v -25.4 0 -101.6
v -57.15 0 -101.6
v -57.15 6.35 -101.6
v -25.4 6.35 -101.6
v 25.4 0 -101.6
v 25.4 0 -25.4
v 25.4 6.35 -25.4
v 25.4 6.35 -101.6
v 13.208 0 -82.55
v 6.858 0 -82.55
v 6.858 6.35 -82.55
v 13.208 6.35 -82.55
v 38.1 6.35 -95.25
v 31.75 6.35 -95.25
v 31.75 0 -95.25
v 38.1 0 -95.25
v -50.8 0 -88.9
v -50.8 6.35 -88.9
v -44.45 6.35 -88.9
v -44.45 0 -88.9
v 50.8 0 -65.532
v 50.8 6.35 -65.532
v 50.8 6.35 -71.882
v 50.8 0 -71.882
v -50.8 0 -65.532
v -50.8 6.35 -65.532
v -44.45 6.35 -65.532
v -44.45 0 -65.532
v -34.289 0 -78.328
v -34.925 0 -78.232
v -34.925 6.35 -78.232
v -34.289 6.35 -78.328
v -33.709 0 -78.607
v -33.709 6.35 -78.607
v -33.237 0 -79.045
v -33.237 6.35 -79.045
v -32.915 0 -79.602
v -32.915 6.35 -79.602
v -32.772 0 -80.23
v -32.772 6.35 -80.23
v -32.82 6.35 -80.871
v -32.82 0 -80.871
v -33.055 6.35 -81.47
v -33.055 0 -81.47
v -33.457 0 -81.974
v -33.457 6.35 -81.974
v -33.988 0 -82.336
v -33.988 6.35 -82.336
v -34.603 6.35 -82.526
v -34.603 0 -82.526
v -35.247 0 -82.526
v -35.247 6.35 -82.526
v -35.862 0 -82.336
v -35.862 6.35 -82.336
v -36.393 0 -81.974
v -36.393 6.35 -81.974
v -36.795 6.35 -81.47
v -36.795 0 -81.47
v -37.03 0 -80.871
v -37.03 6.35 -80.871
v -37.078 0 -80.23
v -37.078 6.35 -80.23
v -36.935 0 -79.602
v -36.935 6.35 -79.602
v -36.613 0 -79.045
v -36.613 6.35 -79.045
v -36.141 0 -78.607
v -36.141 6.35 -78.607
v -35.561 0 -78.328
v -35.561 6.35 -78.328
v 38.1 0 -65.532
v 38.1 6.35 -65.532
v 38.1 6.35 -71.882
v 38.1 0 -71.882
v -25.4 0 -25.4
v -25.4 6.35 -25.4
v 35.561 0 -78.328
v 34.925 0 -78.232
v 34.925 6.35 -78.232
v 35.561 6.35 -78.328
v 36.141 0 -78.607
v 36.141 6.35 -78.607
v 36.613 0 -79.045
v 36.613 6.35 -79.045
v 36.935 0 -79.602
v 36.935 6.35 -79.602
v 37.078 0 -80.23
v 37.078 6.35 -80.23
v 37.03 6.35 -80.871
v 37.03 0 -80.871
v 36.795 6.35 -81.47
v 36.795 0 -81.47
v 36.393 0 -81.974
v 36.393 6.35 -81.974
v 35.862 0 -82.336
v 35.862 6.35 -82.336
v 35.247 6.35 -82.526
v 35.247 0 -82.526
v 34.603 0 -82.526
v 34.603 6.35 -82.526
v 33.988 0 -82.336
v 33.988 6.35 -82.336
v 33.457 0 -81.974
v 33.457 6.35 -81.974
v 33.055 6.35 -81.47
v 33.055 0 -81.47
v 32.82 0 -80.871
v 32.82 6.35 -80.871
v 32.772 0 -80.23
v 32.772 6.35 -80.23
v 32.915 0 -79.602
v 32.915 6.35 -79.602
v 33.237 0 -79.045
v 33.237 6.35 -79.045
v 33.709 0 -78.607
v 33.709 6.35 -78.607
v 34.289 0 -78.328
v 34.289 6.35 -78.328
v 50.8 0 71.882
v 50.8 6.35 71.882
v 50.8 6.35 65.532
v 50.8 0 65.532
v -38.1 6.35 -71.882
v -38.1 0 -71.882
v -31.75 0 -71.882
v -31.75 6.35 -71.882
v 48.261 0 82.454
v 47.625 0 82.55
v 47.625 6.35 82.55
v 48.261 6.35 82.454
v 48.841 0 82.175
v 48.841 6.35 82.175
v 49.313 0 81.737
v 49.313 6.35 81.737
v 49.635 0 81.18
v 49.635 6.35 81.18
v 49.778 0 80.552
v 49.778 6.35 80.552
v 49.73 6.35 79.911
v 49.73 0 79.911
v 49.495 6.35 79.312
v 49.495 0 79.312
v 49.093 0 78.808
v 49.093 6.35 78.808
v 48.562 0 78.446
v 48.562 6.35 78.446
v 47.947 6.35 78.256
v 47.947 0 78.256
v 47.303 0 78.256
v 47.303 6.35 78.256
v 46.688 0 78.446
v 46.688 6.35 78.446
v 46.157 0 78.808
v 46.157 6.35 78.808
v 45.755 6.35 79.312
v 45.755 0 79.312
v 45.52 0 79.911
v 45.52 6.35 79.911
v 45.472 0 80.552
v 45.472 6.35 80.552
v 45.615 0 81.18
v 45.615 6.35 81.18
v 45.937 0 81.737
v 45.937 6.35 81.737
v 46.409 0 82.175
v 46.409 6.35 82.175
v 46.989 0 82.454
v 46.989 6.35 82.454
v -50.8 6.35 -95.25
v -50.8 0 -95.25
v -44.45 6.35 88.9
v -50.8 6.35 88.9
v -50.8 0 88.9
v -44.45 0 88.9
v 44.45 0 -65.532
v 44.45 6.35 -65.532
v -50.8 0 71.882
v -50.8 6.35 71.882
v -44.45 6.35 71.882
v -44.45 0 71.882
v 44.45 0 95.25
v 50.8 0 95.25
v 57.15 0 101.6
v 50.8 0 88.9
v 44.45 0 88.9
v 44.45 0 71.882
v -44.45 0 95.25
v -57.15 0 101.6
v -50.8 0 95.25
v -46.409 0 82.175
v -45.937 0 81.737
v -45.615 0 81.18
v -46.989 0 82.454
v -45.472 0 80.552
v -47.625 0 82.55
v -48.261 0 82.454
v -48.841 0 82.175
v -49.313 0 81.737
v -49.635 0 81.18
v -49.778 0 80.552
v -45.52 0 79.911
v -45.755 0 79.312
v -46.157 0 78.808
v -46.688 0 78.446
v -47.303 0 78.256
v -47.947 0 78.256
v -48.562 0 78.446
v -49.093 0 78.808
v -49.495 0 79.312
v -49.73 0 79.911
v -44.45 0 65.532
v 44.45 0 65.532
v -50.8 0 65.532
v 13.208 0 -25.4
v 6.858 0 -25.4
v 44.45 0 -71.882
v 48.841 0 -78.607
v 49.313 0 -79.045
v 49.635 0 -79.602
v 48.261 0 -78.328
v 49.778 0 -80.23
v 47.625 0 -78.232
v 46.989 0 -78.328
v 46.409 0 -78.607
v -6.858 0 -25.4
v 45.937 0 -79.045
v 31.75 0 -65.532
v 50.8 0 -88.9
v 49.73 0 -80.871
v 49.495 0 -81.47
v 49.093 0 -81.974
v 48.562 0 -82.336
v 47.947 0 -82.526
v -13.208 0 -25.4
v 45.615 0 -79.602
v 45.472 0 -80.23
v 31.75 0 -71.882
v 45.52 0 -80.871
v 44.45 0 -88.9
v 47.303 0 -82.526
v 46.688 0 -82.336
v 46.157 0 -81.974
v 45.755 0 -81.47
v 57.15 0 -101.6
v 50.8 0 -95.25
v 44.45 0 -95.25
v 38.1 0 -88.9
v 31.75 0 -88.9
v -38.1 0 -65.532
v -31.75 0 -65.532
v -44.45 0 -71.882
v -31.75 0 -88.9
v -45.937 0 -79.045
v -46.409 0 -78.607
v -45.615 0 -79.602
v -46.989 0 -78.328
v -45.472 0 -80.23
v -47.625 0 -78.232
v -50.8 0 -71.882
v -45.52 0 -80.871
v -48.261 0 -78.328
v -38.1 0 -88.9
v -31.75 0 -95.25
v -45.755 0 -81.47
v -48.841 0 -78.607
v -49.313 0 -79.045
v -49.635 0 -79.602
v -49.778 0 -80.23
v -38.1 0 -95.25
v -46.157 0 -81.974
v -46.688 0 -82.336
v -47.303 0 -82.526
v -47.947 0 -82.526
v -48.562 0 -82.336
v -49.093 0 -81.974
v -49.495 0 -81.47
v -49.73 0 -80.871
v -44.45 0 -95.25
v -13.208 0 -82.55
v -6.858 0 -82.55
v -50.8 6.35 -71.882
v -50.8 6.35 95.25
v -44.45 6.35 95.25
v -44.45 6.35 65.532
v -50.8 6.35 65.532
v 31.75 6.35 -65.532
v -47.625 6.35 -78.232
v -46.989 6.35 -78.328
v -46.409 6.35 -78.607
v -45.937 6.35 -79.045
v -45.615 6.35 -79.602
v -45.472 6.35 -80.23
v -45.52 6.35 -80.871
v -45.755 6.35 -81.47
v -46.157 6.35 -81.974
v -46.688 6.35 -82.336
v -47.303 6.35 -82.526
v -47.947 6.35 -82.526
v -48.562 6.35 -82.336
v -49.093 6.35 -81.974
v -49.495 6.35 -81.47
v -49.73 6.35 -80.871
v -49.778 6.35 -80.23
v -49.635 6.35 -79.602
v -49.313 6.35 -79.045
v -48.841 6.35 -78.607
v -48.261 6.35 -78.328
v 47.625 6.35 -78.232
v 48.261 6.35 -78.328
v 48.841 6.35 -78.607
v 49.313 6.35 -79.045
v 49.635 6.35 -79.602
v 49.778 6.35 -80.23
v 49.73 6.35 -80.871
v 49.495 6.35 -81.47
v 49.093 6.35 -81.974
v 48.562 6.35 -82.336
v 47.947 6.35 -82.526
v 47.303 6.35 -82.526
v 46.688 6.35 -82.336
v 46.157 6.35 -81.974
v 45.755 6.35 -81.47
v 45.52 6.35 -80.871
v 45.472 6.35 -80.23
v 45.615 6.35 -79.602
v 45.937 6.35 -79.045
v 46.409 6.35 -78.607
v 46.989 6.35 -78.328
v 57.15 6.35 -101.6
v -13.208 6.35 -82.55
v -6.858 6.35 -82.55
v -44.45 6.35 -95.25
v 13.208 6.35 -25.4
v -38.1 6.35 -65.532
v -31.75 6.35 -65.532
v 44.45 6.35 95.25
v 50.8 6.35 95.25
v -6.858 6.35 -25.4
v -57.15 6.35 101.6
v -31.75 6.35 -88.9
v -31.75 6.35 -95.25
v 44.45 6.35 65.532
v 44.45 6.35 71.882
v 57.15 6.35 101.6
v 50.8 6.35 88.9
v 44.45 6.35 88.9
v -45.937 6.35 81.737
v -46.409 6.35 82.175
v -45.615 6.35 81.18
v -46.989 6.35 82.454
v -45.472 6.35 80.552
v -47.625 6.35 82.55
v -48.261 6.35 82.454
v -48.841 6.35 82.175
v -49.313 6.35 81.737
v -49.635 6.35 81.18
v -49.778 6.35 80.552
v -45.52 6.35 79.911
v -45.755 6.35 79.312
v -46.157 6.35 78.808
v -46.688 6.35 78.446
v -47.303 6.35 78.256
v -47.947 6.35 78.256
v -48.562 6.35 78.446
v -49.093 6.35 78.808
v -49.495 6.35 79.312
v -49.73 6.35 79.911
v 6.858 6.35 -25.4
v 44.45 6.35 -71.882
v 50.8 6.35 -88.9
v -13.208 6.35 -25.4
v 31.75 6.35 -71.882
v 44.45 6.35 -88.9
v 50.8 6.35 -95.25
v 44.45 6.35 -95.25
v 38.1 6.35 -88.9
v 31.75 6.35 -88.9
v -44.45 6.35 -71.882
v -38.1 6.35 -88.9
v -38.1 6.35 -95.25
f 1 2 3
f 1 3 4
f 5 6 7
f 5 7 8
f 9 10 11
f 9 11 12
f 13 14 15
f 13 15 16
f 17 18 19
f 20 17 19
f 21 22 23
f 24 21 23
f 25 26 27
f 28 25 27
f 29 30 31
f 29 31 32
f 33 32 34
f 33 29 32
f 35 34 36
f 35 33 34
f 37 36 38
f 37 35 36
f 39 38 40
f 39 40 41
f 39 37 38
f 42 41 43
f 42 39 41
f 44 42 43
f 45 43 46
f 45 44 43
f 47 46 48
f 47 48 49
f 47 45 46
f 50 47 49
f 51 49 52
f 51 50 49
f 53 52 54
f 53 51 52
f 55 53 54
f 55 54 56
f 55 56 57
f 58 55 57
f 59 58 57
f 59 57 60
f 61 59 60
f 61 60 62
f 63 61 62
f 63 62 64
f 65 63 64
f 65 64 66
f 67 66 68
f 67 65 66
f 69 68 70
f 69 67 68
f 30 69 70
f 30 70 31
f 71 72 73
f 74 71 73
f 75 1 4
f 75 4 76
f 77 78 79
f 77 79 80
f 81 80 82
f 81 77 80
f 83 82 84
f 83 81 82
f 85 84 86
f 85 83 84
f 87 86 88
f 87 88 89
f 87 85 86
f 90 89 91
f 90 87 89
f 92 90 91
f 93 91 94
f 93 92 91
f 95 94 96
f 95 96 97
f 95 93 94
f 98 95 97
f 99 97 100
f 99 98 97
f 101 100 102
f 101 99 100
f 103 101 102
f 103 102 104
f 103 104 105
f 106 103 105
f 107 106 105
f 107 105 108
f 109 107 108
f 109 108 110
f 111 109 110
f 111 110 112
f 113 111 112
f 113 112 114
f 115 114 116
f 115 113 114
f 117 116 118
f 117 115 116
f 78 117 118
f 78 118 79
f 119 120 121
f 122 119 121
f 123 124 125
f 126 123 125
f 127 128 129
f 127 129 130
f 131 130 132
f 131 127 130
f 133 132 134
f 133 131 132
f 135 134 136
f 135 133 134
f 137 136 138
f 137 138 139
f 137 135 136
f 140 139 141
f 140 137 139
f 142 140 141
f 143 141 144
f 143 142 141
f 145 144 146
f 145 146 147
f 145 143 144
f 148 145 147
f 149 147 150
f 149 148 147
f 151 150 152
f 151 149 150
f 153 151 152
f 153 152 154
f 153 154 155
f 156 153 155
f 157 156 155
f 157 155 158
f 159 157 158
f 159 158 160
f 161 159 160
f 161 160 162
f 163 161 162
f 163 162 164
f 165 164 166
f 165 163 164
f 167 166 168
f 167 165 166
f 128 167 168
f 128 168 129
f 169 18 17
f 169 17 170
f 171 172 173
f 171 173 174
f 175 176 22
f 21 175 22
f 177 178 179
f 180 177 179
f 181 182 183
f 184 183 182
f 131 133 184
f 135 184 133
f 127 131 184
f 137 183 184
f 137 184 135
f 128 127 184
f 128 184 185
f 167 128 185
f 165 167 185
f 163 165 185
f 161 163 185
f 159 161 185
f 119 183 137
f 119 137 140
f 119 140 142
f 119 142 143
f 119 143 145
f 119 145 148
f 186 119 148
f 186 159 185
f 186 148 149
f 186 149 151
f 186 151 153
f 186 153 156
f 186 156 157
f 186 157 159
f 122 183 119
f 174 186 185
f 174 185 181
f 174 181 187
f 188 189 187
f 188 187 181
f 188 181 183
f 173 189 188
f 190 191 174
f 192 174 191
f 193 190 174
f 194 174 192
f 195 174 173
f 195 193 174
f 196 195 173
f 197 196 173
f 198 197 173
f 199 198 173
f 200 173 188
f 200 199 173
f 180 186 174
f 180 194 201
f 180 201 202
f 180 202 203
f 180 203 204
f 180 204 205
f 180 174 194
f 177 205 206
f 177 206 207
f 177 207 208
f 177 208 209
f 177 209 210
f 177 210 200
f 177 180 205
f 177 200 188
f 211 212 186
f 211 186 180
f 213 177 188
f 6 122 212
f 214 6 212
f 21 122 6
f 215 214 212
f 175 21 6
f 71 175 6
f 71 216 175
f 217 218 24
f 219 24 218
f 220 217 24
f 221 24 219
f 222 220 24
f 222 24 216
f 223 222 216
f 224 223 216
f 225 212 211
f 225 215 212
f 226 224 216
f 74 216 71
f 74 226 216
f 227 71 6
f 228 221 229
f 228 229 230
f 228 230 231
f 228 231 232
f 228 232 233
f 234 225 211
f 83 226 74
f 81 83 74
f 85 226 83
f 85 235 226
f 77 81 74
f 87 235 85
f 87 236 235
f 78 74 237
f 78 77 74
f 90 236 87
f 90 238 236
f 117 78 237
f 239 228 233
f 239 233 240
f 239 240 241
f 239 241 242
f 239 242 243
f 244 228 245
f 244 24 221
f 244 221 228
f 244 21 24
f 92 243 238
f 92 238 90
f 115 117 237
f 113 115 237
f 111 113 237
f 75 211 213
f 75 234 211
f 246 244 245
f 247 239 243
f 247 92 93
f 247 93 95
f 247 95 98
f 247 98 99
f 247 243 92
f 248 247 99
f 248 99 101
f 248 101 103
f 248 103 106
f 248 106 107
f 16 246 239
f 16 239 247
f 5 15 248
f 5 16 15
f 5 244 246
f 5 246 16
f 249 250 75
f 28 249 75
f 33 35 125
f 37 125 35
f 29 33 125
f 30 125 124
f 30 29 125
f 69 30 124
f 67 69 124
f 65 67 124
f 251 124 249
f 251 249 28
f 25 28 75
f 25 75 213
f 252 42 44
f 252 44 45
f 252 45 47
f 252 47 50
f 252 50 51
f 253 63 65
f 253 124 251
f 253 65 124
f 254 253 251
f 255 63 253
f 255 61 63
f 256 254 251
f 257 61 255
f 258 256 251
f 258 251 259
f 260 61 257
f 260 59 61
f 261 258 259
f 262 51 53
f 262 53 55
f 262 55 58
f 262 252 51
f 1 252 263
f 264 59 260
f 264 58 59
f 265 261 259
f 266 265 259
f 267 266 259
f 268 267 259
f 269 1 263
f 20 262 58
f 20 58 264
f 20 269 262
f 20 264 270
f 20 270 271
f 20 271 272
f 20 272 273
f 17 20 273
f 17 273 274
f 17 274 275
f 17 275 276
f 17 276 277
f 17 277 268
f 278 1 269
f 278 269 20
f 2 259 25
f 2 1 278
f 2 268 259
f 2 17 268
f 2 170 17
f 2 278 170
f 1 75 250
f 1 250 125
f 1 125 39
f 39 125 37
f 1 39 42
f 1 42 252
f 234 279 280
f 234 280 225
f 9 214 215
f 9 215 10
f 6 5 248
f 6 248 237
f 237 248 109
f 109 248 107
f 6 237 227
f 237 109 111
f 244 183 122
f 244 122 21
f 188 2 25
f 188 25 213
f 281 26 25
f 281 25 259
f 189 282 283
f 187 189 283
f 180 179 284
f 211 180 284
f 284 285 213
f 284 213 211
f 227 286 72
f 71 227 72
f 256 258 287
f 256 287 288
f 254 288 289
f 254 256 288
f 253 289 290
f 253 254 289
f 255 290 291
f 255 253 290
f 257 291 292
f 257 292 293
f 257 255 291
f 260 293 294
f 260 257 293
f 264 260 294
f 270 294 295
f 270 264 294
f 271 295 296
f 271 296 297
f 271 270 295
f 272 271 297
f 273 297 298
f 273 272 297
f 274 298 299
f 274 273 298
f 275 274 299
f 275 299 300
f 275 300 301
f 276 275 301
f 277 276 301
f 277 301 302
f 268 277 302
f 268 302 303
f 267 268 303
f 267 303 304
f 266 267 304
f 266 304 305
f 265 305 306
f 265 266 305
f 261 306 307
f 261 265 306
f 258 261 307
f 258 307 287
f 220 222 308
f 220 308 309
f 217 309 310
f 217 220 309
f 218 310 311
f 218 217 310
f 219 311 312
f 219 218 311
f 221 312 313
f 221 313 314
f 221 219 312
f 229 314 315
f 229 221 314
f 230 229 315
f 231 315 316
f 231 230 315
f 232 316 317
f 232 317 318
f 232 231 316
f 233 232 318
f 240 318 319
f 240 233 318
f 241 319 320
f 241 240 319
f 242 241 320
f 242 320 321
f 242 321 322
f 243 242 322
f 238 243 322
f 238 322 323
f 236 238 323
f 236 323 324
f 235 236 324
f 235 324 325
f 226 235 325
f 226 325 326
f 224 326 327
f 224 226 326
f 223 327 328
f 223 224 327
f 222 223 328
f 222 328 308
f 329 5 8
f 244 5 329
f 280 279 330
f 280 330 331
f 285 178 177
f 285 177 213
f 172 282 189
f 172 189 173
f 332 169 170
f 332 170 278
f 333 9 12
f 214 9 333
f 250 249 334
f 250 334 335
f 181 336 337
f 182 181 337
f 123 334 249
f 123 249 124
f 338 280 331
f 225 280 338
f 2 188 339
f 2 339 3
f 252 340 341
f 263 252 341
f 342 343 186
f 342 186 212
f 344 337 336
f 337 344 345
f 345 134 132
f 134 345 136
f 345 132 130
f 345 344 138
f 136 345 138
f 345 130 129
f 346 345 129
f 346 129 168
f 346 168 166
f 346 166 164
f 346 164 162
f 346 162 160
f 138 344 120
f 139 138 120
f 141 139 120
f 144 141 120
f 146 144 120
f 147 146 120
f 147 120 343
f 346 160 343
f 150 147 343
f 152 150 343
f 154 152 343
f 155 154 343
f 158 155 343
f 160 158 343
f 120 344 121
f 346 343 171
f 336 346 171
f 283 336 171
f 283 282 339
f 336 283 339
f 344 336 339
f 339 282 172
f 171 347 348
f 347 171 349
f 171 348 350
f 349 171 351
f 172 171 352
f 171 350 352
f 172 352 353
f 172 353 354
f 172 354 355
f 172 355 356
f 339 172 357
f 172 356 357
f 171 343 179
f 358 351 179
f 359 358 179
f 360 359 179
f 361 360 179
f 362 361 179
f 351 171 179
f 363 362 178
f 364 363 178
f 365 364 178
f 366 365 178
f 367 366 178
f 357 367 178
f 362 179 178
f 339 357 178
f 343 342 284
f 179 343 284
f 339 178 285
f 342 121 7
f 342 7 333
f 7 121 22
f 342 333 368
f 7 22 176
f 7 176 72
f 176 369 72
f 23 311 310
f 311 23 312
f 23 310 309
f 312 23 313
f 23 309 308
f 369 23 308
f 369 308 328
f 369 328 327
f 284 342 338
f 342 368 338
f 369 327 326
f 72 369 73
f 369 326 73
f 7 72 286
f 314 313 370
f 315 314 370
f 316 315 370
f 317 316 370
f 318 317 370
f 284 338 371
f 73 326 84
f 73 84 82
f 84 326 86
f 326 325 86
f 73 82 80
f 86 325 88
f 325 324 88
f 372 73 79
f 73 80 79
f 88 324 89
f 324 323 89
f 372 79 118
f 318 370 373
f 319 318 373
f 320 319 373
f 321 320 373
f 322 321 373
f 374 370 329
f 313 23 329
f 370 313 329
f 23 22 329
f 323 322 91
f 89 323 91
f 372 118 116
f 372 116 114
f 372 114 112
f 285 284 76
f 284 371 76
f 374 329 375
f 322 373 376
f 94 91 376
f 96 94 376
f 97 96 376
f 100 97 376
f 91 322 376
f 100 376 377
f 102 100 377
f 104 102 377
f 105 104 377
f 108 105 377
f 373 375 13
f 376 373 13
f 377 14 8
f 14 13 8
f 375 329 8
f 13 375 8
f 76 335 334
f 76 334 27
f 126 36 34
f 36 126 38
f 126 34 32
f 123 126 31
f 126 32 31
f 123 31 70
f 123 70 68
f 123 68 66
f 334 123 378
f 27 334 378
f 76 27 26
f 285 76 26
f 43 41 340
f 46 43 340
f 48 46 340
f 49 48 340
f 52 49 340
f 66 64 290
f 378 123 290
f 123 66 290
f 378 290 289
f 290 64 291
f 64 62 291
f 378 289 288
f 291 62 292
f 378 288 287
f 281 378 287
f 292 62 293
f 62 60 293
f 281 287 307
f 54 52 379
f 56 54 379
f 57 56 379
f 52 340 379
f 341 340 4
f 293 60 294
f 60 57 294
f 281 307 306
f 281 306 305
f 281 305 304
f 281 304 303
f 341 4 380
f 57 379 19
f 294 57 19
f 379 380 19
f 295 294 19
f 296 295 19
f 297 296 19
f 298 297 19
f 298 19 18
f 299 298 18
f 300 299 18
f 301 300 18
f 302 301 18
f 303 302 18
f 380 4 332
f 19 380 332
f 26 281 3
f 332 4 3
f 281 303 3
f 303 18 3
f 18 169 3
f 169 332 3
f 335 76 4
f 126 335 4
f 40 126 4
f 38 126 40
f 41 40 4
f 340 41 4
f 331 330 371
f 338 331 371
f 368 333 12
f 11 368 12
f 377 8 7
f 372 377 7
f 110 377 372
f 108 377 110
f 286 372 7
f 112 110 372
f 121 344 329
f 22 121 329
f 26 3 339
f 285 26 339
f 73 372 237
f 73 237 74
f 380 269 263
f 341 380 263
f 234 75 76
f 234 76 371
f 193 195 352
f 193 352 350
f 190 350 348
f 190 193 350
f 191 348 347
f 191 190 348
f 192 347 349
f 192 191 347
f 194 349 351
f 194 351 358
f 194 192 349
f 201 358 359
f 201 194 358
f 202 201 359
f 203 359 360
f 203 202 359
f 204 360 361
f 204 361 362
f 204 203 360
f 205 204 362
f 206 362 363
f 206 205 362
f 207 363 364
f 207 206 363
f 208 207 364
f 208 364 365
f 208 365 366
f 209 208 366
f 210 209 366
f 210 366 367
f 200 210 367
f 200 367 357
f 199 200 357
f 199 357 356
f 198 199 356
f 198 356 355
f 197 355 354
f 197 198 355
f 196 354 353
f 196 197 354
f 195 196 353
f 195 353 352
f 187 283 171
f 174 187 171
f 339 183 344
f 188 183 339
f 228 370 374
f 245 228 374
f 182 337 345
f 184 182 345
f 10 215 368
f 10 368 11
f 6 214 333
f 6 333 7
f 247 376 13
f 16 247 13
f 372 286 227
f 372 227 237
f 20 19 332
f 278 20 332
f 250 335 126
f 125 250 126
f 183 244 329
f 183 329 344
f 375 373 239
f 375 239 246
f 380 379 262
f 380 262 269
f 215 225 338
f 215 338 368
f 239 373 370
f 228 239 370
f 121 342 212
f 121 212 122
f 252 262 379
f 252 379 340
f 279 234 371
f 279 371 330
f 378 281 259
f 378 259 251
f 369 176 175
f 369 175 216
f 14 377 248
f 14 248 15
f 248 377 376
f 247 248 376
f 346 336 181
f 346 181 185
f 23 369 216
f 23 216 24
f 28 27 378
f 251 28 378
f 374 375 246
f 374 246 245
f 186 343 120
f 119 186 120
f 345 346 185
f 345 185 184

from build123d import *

# Parameters (mm, degrees)
SKETCH1_R           = 2.159
SKETCH1_W           = 6.35
SKETCH1_H           = 6.35
BOSS_EXTRUDE1_DEPTH = 6.35


with BuildPart() as part:
    # Sketch1 → Boss-Extrude1 (new body)
    with BuildSketch(Plane(origin=(0, 0, 0), x_dir=(1, 0, 0), z_dir=(0, 1, 0))):
        Polygon((-57.15, 101.6), (-25.4, 101.6), (-25.4, 25.4), (-13.208, 25.4), (-13.208, 82.55), (-6.858, 82.55), (-6.858, 25.4), (6.858, 25.4), (6.858, 82.55), (13.208, 82.55), (13.208, 25.4), (25.4, 25.4), (25.4, 101.6), (57.15, 101.6), (57.15, -101.6), (-57.15, -101.6), align=None)
        with Locations(Location((34.925, 80.391, 0), (0, 0, 270))):
            Circle(SKETCH1_R, mode=Mode.SUBTRACT)
        with Locations(Location((-34.925, 80.391, 0), (0, 0, 270))):
            Circle(SKETCH1_R, mode=Mode.SUBTRACT)
        with Locations(Location((47.625, 80.391, 0), (0, 0, 270))):
            Circle(SKETCH1_R, mode=Mode.SUBTRACT)
        with Locations(Location((-47.625, 80.391, 0), (0, 0, 270))):
            Circle(SKETCH1_R, mode=Mode.SUBTRACT)
        with Locations(Location((47.625, -80.391, 0), (0, 0, 270))):
            Circle(SKETCH1_R, mode=Mode.SUBTRACT)
        with Locations(Location((-47.625, -80.391, 0), (0, 0, 270))):
            Circle(SKETCH1_R, mode=Mode.SUBTRACT)
        with Locations((34.925, 92.075)):
            Rectangle(SKETCH1_W, SKETCH1_H, mode=Mode.SUBTRACT)
        with Locations((34.925, 68.707)):
            Rectangle(SKETCH1_W, SKETCH1_H, mode=Mode.SUBTRACT)
        with Locations((-34.925, 92.075)):
            Rectangle(SKETCH1_W, SKETCH1_H, mode=Mode.SUBTRACT)
        with Locations((-34.925, 68.707)):
            Rectangle(SKETCH1_W, SKETCH1_H, mode=Mode.SUBTRACT)
        with Locations((47.625, 92.075)):
            Rectangle(SKETCH1_W, SKETCH1_H, mode=Mode.SUBTRACT)
        with Locations((47.625, 68.707)):
            Rectangle(SKETCH1_W, SKETCH1_H, mode=Mode.SUBTRACT)
        with Locations((-47.625, 92.075)):
            Rectangle(SKETCH1_W, SKETCH1_H, mode=Mode.SUBTRACT)
        with Locations((-47.625, 68.707)):
            Rectangle(SKETCH1_W, SKETCH1_H, mode=Mode.SUBTRACT)
        with Locations((47.625, -68.707)):
            Rectangle(SKETCH1_W, SKETCH1_H, mode=Mode.SUBTRACT)
        with Locations((47.625, -92.075)):
            Rectangle(SKETCH1_W, SKETCH1_H, mode=Mode.SUBTRACT)
        with Locations((-47.625, -68.707)):
            Rectangle(SKETCH1_W, SKETCH1_H, mode=Mode.SUBTRACT)
        with Locations((-47.625, -92.075)):
            Rectangle(SKETCH1_W, SKETCH1_H, mode=Mode.SUBTRACT)
    extrude(amount=BOSS_EXTRUDE1_DEPTH)


solid = part.part
